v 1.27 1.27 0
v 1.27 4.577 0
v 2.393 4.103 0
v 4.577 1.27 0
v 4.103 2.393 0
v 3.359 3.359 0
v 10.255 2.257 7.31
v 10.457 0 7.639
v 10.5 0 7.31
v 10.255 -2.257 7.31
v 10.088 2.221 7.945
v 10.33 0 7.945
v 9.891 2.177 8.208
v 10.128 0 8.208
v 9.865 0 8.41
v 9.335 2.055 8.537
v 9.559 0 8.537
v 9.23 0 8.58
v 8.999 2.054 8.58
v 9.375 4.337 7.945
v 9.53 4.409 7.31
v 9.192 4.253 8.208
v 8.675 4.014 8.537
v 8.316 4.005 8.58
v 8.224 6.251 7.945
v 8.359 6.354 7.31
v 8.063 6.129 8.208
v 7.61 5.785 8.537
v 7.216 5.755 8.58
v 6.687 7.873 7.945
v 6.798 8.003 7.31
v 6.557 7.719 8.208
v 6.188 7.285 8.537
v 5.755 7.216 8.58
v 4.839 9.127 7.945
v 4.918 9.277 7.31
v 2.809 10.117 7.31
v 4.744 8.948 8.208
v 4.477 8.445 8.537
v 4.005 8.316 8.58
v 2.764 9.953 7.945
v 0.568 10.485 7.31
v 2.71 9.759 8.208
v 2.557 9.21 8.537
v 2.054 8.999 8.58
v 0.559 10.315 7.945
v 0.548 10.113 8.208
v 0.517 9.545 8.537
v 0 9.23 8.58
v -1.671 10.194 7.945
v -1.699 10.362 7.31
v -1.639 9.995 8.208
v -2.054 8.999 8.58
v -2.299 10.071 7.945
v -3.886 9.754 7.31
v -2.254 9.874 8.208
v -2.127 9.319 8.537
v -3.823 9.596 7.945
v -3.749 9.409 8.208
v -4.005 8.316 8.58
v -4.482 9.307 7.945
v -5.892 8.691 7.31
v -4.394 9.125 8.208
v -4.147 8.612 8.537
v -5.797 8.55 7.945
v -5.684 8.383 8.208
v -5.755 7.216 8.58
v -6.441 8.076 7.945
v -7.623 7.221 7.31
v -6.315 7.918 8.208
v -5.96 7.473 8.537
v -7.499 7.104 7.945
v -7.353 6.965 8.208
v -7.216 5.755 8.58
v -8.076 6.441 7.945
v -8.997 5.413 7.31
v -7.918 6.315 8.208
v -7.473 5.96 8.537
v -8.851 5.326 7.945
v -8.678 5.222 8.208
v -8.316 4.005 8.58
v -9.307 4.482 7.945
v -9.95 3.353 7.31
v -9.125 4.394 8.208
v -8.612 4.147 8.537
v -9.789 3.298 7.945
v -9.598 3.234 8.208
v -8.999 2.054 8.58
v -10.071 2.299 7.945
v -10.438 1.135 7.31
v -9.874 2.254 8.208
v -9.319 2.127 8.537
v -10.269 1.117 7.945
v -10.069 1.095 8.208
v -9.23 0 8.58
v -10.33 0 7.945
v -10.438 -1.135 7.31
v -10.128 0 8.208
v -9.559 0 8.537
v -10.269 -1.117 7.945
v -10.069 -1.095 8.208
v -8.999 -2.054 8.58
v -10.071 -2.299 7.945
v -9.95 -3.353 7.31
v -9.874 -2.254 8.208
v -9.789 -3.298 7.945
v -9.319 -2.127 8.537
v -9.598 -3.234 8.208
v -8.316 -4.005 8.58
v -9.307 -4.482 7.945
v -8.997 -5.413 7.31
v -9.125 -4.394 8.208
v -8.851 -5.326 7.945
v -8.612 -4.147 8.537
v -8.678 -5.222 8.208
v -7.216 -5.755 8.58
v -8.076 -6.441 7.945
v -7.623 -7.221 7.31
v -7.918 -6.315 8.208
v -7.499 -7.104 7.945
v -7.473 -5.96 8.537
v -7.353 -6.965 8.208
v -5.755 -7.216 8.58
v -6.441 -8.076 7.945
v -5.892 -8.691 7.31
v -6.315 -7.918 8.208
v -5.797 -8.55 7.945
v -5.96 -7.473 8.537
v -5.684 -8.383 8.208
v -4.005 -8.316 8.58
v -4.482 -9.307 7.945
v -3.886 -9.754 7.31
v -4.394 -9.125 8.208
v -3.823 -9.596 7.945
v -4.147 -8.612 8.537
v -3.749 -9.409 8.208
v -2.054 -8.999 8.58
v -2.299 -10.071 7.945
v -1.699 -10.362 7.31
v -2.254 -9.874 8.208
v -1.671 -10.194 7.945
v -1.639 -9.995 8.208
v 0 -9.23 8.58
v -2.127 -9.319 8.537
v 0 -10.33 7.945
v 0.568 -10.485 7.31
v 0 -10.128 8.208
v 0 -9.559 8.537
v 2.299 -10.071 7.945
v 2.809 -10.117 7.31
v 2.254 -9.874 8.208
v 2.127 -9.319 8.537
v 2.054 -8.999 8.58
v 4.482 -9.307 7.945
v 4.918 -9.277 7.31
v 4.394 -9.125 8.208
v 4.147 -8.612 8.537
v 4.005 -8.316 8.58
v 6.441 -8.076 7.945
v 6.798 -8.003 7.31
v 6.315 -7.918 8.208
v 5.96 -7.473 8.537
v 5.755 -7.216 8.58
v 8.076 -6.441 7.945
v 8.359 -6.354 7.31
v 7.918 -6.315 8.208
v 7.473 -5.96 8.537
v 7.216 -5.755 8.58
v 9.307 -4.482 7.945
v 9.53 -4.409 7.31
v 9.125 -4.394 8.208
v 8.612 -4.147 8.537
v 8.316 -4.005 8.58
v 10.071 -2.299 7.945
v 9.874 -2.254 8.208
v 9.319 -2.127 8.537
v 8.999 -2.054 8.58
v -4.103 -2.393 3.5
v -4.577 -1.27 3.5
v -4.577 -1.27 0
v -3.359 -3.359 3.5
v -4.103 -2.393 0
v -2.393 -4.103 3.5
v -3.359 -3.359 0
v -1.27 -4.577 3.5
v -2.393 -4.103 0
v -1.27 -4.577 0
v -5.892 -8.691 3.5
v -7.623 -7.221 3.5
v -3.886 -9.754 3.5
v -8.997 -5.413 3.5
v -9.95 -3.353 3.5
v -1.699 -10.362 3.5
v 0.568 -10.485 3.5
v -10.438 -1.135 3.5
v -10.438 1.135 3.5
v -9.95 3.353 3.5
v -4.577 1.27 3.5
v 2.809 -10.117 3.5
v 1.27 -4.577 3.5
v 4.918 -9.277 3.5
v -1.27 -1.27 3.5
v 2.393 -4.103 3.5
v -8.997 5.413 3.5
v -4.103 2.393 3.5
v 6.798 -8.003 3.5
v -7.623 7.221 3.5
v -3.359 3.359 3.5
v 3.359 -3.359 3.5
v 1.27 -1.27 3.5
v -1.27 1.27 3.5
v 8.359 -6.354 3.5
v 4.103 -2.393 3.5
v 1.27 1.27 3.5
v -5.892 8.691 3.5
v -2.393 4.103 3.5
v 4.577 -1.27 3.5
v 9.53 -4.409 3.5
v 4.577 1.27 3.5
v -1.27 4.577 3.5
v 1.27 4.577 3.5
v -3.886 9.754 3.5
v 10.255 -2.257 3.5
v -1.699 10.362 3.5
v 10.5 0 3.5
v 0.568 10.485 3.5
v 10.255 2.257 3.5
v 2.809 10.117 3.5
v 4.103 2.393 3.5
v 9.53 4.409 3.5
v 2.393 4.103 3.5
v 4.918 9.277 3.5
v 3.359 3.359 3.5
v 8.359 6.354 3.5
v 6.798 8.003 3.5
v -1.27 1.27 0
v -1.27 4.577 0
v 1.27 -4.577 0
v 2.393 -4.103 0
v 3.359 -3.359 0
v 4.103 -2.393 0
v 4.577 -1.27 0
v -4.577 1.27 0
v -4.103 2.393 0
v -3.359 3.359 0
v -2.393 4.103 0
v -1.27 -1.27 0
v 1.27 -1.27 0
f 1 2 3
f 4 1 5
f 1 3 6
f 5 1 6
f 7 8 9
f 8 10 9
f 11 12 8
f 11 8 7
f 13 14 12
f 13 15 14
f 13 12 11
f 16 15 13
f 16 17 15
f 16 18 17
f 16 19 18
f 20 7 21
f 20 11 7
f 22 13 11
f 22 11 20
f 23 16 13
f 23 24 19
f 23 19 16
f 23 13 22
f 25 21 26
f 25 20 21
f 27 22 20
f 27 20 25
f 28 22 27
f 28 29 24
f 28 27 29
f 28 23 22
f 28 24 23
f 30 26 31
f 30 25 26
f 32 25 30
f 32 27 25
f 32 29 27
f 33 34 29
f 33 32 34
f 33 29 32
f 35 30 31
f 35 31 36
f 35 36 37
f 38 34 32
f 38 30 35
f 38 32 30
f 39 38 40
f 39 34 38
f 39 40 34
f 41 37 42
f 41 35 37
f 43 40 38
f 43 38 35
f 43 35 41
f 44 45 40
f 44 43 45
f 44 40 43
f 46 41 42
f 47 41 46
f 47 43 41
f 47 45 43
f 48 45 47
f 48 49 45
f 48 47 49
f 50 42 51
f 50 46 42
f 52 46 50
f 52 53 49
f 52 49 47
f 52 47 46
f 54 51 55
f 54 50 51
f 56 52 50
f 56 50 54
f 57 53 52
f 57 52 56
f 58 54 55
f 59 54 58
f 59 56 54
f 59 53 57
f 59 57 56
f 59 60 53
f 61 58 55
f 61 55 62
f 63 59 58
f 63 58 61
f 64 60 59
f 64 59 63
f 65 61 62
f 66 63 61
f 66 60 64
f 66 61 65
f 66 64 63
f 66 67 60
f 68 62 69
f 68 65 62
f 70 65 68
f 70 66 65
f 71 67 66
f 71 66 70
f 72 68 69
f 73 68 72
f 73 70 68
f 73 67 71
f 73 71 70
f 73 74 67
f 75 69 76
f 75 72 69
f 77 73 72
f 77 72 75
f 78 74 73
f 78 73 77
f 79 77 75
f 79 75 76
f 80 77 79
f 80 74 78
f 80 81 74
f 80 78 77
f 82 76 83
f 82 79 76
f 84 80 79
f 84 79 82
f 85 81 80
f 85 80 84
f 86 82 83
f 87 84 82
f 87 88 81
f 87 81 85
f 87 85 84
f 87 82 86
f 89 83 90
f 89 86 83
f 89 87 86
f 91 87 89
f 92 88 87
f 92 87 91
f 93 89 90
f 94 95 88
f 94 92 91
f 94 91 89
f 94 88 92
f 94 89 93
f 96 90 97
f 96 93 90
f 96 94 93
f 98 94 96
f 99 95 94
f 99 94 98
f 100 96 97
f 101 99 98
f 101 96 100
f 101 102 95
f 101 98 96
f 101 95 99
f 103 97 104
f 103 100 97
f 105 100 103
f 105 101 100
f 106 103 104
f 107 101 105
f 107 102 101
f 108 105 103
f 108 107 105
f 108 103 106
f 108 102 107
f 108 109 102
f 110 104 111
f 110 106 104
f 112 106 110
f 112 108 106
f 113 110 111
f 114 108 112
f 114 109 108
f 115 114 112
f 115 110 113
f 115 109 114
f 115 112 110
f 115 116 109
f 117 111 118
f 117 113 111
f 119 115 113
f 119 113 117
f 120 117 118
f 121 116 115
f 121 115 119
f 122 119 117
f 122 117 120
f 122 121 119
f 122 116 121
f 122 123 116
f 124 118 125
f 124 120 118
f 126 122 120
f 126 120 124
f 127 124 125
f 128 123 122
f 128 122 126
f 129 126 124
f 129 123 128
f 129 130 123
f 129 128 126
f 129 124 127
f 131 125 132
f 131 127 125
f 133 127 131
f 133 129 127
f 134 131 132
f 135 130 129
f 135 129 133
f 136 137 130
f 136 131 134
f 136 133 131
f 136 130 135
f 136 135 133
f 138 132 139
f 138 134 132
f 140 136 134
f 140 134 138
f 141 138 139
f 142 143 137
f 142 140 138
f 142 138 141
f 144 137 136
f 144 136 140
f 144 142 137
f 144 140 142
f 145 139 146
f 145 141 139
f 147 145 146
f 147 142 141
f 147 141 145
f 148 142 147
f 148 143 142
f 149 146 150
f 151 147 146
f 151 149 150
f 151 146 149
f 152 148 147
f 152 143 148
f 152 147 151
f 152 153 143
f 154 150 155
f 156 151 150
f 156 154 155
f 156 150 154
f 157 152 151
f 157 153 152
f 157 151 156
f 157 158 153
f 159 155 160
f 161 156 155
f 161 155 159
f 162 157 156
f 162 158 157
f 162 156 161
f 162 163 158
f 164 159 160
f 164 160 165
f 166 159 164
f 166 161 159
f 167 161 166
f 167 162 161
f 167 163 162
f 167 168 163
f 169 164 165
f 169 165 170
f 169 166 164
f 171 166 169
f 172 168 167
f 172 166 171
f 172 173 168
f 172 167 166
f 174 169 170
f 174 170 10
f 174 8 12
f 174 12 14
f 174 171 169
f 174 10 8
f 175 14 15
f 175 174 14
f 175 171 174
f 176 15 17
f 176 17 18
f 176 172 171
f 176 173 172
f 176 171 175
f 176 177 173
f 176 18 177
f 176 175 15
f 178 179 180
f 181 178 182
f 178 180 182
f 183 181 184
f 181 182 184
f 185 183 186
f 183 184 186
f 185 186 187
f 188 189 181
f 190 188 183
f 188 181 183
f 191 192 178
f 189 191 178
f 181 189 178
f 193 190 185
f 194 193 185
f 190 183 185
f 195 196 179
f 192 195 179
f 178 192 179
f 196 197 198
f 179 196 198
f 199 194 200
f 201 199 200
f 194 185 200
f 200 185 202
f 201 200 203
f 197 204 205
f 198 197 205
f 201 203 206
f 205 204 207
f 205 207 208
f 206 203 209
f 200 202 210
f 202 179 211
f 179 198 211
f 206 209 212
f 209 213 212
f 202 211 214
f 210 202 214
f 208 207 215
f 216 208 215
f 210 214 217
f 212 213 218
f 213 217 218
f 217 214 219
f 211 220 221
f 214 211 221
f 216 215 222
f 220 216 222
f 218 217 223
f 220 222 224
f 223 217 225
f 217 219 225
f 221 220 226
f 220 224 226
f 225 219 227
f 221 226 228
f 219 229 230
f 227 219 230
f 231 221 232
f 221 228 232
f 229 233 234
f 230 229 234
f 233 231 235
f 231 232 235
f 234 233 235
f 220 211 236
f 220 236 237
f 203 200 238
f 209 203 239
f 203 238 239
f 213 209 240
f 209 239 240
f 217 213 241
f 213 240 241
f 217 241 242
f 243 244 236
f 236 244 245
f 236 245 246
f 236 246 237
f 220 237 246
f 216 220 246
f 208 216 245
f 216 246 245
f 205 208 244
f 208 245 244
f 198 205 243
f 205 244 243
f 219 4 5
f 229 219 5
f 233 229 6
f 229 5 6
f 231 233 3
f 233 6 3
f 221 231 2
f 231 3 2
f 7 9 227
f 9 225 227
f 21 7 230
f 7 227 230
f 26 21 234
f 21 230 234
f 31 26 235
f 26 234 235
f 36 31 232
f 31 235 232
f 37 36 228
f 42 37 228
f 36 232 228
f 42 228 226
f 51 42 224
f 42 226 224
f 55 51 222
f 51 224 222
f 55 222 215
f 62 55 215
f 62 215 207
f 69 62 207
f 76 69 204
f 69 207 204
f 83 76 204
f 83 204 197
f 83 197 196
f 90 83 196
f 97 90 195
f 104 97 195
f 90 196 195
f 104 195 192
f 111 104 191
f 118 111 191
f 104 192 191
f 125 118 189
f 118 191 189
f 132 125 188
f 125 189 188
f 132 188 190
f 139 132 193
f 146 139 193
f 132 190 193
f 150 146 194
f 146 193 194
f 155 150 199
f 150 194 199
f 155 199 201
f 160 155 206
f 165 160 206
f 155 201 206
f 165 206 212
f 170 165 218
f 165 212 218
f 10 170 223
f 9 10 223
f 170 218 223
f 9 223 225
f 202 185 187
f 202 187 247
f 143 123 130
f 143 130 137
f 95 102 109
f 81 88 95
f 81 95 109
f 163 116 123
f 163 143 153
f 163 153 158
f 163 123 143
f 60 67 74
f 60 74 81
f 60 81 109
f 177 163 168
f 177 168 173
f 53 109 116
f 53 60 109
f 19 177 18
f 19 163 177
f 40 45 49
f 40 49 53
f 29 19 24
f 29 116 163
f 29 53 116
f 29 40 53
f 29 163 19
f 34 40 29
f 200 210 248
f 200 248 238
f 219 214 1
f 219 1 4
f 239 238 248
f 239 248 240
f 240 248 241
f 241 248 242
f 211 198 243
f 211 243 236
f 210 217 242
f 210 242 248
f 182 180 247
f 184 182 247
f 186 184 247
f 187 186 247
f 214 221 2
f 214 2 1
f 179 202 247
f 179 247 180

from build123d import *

# Parameters (mm, degrees)
F0_R     = 4.75
F1_DEPTH = 3.5
F2_R     = 10.5
F2_R_2   = 4.75
F3_DEPTH = 5.08
F4_R     = 1.27
F6_DEPTH = 25.4


with BuildPart() as f1:
    # F0 (on Top) → F1 (new body)
    with BuildSketch(Plane.XY):
        Circle(F0_R)
    extrude(amount=F1_DEPTH)

    # F2 (on face) → F3 (join)
    with BuildSketch(Plane.XY.offset(3.5)):
        Circle(F2_R)
        Circle(F2_R_2, mode=Mode.SUBTRACT)
        Circle(F2_R_2)
    extrude(amount=F3_DEPTH)

    # F4
    f4_edges = [f1.edges().sort_by_distance(p)[0] for p in [
        (-10.5, 0, 8.58),
    ]]
    fillet(f4_edges, radius=F4_R)

    # F5 (on face) → F6 (cut)
    with BuildSketch(Plane(origin=(0, 0, 3.5), x_dir=(1, 0, 0), z_dir=(0, 0, -1))):
        Polygon((1.27, 1.27), (1.27, 0), (1.27, -1.27), (10.422912261, -1.27), (10.422912261, 1.27), align=None)
        Polygon((1.27, -1.27), (1.27, 0), (1.27, 1.27), (0, 1.27), (-1.27, 1.27), (-1.27, 0), (-1.27, -1.27), (0, -1.27), align=None)
        Polygon((1.27, -10.422912261), (1.27, -1.27), (0, -1.27), (-1.27, -1.27), (-1.27, -10.422912261), align=None)
        Polygon((0, 1.27), (1.27, 1.27), (1.27, 10.422912261), (-1.27, 10.422912261), (-1.27, 1.27), align=None)
        Polygon((-10.422912261, -1.27), (-1.27, -1.27), (-1.27, 0), (-1.27, 1.27), (-10.422912261, 1.27), align=None)
    extrude(amount=F6_DEPTH, mode=Mode.SUBTRACT)


solid = f1.part
